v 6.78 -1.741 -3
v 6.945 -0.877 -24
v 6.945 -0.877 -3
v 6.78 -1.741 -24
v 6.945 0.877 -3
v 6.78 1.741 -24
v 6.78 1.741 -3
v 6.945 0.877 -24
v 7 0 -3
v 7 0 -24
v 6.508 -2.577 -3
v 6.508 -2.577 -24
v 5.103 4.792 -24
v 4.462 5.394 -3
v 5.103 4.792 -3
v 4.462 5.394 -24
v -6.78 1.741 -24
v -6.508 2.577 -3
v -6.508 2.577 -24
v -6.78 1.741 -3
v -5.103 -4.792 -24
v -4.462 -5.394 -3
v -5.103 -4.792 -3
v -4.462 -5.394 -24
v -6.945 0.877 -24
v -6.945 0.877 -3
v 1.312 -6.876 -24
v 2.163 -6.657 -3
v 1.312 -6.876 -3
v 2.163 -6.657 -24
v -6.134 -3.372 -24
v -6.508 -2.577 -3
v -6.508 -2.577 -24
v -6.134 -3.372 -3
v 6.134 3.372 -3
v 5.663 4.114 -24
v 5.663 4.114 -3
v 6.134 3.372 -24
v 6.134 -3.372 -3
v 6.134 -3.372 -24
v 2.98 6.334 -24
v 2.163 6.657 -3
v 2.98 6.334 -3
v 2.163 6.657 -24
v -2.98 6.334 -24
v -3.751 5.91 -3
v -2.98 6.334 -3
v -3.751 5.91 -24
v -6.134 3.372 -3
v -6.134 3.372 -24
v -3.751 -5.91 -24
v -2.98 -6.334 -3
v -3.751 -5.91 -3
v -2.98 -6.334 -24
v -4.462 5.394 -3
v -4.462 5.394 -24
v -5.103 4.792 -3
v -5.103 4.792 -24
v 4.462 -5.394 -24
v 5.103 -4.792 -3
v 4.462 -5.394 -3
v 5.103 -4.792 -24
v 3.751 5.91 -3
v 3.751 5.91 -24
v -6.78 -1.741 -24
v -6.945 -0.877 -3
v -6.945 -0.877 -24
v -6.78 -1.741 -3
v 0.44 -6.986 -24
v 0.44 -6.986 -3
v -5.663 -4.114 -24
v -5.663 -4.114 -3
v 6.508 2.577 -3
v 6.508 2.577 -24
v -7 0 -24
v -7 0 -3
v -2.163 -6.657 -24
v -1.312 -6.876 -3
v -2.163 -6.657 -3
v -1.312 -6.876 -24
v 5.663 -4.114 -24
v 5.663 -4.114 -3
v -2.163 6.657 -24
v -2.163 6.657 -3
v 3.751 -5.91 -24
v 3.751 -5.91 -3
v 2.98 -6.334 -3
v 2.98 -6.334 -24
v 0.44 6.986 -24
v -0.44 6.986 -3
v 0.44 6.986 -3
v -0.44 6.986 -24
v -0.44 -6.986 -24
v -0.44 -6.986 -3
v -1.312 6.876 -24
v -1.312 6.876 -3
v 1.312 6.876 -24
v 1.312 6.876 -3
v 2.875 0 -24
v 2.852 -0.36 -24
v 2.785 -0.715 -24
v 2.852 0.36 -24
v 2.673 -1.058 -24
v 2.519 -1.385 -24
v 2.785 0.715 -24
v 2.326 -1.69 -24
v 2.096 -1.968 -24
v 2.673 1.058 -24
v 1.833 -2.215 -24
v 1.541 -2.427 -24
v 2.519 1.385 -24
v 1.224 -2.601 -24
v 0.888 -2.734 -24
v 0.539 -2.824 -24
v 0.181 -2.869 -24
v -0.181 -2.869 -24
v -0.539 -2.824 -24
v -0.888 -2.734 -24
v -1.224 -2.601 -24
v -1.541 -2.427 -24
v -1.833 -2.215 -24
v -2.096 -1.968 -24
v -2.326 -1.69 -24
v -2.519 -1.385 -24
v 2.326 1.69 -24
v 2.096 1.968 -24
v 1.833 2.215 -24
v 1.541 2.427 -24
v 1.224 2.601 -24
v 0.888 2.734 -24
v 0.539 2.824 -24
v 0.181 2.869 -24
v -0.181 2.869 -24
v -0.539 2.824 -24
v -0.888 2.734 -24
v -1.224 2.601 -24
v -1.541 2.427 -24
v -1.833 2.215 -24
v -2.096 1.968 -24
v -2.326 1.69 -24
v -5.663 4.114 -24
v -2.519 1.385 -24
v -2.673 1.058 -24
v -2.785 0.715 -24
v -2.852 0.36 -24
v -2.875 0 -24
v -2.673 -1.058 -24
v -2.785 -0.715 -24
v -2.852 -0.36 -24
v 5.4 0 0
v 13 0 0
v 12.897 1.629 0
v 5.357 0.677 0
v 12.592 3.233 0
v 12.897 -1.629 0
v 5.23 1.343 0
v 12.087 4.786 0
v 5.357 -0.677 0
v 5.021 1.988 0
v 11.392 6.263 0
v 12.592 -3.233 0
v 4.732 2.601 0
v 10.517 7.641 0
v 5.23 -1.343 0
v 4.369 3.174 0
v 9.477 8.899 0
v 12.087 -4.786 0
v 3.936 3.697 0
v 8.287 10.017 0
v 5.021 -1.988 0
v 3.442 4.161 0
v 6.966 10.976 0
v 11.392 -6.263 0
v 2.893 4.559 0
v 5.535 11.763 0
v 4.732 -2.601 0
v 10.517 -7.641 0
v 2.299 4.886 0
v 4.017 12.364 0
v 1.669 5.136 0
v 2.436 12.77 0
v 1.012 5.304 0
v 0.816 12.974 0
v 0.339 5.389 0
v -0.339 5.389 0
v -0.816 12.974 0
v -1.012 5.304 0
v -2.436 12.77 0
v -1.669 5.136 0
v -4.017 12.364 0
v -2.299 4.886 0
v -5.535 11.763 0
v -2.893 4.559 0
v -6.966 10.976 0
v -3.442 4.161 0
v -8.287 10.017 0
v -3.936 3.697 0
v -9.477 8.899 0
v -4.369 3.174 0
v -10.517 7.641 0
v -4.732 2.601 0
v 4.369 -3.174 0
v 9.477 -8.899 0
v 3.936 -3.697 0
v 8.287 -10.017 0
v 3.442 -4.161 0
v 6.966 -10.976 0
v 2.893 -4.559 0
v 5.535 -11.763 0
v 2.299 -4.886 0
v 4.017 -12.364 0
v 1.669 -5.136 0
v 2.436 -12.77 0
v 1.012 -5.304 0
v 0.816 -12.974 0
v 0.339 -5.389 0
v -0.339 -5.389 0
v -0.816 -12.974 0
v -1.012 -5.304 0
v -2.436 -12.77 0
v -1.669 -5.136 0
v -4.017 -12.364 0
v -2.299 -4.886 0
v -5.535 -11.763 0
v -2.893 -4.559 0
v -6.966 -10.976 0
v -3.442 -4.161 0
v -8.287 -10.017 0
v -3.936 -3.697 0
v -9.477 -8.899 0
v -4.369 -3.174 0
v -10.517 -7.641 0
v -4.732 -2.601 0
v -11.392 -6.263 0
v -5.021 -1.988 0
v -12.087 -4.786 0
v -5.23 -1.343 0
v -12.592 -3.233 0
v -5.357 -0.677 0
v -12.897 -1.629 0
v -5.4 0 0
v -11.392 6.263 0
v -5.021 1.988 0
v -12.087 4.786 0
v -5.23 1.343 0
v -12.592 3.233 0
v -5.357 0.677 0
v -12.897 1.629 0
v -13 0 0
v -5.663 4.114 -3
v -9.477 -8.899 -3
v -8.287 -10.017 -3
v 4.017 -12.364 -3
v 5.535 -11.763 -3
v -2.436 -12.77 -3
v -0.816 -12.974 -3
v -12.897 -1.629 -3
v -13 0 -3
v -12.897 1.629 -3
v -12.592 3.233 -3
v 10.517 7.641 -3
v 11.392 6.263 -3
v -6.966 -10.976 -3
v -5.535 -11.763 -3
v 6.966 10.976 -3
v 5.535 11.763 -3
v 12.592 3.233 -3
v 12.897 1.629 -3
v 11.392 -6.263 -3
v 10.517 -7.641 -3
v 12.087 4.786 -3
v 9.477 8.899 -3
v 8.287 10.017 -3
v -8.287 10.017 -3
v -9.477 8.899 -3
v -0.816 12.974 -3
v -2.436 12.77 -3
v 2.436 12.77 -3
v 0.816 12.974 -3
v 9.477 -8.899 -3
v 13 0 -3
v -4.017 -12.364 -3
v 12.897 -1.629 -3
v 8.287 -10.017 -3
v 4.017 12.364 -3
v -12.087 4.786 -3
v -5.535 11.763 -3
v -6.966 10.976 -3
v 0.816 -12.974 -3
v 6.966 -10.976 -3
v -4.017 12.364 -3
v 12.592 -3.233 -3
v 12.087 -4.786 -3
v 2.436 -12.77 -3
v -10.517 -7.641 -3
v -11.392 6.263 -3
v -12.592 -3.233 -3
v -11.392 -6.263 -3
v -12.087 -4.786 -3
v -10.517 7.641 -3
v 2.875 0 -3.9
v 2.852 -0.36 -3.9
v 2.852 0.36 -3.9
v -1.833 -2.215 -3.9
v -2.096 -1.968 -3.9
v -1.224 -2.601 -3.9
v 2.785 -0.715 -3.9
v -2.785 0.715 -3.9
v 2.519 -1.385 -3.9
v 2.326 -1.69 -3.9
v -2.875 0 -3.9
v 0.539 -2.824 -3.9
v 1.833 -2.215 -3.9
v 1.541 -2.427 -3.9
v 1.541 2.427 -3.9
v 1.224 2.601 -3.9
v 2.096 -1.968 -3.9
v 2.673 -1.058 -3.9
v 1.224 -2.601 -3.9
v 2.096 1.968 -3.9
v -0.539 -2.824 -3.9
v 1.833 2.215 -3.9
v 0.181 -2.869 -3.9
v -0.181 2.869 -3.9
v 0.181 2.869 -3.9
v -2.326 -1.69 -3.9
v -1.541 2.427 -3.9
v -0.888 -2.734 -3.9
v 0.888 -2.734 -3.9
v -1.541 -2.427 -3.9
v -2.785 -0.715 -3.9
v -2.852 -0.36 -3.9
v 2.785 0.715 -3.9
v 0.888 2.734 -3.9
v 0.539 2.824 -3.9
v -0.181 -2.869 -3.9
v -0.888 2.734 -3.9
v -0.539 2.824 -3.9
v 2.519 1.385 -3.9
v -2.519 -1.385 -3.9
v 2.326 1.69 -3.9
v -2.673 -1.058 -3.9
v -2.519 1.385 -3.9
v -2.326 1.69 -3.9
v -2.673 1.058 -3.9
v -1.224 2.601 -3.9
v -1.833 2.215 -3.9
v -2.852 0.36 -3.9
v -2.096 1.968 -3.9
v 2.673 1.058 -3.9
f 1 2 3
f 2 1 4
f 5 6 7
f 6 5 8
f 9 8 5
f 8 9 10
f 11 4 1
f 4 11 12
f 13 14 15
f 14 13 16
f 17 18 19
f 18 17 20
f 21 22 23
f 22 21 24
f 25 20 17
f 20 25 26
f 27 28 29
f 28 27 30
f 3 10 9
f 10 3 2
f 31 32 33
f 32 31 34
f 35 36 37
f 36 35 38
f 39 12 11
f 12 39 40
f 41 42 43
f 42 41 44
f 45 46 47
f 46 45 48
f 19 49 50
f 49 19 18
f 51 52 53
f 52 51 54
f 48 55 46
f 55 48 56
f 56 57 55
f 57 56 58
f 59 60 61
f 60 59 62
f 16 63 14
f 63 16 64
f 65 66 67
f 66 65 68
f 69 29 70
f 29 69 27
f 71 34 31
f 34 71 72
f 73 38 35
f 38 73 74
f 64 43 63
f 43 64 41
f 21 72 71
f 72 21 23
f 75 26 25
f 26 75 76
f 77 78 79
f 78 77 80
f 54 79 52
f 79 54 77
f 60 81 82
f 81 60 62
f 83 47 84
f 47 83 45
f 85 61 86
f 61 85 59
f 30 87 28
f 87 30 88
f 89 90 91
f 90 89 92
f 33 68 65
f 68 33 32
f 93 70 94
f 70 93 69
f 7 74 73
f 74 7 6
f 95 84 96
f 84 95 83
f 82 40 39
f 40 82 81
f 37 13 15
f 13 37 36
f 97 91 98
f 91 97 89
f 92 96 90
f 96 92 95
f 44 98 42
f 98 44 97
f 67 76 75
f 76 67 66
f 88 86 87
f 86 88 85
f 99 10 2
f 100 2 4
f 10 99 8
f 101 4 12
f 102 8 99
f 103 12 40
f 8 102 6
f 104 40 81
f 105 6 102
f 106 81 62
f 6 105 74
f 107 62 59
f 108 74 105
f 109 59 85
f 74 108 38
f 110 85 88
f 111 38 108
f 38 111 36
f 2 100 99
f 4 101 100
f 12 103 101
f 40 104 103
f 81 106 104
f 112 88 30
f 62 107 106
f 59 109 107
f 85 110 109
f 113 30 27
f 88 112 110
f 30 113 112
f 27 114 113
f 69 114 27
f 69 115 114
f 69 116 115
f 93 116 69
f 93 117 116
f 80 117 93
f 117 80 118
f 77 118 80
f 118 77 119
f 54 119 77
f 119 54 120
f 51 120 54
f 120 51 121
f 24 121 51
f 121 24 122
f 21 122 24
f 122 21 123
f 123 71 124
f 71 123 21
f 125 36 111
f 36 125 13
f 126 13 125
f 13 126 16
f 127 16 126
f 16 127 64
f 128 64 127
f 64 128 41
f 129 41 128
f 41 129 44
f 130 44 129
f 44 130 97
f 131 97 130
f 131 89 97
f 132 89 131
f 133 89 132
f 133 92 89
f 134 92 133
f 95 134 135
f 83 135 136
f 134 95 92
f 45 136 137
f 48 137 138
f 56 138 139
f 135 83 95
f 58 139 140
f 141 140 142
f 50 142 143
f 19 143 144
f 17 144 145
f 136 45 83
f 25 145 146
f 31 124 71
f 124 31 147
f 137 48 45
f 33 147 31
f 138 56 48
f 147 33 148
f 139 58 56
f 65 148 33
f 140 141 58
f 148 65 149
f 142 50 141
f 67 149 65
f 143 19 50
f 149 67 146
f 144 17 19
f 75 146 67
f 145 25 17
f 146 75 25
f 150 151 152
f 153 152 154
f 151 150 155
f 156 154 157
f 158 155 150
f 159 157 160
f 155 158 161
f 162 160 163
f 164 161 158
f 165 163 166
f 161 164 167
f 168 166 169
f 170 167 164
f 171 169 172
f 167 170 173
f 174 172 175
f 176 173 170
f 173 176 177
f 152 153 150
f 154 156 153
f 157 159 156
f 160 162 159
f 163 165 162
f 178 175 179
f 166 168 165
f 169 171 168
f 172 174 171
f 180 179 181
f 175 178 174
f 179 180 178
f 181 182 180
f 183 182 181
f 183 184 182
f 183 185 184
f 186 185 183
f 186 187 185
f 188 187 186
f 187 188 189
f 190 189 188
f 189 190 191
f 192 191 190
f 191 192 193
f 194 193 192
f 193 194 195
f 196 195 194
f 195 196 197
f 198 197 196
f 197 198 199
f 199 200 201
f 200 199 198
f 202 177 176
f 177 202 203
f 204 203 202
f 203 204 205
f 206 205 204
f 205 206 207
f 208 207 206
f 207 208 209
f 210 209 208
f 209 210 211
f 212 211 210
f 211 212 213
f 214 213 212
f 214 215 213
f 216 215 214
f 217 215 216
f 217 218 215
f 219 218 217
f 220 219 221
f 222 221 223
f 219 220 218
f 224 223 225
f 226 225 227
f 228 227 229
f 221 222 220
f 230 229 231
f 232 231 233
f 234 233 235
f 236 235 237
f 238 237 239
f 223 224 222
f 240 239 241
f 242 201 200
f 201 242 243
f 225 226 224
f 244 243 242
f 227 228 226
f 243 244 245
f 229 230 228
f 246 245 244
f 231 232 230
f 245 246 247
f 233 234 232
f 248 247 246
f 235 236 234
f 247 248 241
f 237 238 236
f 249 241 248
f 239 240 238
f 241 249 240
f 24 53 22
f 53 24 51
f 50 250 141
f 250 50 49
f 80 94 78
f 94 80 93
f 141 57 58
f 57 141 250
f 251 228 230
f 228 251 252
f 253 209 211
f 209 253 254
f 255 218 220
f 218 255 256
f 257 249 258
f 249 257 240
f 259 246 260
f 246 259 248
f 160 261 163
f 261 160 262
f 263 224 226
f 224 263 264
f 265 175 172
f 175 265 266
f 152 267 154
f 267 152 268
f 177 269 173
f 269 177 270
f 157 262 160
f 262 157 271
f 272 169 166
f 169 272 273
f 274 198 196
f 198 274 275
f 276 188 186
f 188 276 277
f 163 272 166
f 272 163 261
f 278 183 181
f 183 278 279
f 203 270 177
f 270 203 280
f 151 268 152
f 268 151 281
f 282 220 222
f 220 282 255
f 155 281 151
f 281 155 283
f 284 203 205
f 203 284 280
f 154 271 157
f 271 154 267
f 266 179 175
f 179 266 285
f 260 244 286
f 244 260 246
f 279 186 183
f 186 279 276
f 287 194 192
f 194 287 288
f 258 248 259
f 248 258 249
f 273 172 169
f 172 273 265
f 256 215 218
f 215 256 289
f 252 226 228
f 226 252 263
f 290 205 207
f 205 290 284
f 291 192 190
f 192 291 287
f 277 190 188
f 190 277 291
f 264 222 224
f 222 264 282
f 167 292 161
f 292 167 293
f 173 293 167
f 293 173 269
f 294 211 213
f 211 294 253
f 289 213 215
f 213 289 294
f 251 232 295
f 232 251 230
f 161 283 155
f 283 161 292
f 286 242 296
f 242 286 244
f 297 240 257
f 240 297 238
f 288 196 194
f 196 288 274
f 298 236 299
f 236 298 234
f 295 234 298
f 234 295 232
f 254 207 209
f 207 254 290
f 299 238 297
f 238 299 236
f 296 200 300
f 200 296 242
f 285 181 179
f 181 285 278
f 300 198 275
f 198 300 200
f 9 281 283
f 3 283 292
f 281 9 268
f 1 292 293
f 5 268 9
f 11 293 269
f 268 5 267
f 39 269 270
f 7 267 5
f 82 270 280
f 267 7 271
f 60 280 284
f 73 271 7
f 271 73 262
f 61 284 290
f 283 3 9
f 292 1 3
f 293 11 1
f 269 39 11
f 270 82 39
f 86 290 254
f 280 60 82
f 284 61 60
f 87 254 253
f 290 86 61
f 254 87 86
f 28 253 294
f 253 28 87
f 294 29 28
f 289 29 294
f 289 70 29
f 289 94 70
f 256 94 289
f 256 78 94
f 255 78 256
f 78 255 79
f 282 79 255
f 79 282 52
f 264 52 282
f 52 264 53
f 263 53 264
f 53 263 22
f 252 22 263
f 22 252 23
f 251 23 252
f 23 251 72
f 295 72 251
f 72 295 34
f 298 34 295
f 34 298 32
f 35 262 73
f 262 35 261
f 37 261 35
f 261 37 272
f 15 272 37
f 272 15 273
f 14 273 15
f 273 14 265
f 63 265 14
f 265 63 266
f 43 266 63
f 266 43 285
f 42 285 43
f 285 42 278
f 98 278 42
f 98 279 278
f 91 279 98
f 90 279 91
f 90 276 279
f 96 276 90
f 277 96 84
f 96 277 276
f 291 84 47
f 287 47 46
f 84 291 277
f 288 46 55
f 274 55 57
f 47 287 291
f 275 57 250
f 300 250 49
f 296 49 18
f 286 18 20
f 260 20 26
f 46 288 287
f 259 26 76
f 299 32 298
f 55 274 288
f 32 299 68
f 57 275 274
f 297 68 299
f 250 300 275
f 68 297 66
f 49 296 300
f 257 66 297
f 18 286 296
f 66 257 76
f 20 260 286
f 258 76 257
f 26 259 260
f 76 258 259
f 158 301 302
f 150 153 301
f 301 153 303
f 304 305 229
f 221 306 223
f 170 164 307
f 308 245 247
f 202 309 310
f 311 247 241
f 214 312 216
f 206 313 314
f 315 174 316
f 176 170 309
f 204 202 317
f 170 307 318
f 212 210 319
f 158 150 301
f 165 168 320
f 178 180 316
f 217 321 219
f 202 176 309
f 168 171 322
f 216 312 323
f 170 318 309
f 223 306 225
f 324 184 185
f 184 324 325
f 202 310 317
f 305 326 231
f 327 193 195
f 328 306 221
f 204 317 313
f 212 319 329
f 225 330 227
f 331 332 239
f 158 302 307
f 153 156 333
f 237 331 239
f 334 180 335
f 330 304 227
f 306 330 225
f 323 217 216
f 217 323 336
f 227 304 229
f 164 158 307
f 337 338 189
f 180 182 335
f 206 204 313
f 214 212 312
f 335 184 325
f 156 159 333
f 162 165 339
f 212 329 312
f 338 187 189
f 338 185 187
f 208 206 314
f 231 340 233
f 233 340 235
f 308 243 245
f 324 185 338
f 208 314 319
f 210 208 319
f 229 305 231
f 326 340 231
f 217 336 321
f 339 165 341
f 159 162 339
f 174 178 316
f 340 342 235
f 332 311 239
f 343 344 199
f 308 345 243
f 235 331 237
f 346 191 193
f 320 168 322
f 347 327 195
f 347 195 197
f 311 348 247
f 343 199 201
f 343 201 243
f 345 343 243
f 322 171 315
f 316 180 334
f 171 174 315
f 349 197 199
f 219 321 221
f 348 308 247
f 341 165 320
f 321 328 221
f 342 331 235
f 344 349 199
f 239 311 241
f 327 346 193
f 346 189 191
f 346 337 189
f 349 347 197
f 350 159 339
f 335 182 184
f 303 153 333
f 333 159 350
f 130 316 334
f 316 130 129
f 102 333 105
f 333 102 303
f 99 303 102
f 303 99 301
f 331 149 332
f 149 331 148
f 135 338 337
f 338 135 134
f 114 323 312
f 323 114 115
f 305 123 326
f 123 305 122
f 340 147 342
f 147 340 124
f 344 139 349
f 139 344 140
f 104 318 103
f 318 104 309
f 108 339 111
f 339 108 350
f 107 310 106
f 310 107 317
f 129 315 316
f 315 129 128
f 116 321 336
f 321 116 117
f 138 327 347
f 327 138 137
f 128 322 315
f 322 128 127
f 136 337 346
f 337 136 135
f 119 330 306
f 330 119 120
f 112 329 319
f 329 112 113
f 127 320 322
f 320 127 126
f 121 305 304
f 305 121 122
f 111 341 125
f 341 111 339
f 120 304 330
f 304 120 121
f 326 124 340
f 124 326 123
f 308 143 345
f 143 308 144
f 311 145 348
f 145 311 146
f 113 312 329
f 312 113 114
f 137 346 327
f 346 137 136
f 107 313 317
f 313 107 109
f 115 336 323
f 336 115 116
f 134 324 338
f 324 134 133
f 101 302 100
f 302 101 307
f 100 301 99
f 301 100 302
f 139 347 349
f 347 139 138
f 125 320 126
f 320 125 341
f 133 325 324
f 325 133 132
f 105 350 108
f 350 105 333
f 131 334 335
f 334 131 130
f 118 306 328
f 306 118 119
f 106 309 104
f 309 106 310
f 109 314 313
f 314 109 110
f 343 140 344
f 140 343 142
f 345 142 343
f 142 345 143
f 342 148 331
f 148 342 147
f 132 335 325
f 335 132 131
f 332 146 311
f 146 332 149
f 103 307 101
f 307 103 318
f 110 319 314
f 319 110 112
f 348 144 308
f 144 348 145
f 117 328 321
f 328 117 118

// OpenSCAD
$fn = 50;


difference() {
	union() {
		translate(v = [0, 0, -24.0000000000]) {
			cylinder(h = 24, r = 7.0000000000);
		}
		translate(v = [0, 0, -3.0000000000]) {
			cylinder(h = 3, r = 13.0000000000);
		}
	}
	union() {
		translate(v = [0, 0, 0]) {
			rotate(a = [0, 0, 0]) {
				difference() {
					union() {
						#translate(v = [0, 0, -24.0000000000]) {
							cylinder(h = 24, r = 2.6000000000);
						}
						#translate(v = [0, 0, -3.9000000000]) {
							cylinder(h = 3.9000000000, r1 = 2.8750000000, r2 = 5.4000000000);
						}
						#translate(v = [0, 0, -24.0000000000]) {
							cylinder(h = 24, r = 2.8750000000);
						}
						#translate(v = [0, 0, -24.0000000000]) {
							cylinder(h = 24, r = 2.6000000000);
						}
					}
					union();
				}
			}
		}
	}
}
